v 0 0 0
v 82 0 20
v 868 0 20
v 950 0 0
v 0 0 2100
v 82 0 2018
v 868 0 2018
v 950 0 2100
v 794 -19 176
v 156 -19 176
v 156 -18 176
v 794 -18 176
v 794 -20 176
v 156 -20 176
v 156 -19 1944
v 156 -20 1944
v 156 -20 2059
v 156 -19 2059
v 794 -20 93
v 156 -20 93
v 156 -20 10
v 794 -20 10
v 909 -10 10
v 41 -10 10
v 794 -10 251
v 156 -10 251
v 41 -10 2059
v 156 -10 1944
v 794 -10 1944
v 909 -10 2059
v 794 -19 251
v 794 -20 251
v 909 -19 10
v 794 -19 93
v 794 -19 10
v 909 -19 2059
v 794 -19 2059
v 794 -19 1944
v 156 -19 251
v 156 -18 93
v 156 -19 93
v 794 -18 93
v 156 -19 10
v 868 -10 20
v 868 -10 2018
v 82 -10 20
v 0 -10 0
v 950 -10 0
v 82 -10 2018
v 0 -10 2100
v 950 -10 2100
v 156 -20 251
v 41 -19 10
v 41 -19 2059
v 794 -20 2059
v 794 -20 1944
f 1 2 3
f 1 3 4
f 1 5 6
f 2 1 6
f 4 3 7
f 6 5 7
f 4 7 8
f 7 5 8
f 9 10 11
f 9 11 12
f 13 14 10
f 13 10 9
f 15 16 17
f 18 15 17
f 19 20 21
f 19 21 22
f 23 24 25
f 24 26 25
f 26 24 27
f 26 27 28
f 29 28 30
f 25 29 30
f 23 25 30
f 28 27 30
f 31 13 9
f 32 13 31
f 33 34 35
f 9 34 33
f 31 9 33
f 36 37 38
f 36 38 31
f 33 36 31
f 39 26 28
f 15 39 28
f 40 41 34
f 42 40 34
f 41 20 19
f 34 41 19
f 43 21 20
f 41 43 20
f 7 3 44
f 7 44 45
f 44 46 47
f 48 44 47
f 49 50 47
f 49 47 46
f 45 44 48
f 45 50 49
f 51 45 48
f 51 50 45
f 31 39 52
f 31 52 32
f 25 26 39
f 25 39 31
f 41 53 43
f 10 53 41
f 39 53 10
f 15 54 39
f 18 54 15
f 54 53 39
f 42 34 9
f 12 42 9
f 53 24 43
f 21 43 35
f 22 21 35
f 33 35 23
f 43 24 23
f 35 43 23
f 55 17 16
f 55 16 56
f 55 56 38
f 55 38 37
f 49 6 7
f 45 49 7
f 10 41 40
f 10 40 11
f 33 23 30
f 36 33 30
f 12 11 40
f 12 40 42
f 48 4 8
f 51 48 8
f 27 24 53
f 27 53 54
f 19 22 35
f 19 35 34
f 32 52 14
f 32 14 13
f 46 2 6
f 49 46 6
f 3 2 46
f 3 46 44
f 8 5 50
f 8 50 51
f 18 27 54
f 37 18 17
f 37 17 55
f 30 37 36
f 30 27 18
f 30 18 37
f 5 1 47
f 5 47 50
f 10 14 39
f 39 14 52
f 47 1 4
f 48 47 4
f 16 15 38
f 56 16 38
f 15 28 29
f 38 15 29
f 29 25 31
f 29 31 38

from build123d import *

# Parameters (mm, degrees)
F0_W     = 950
F0_H     = 2100
F0_W_2   = 786
F0_H_2   = 1998
F1_DEPTH = 10
F2_W     = 868
F2_H     = 2049
F2_W_2   = 786
F2_H_2   = 1998
F2_W_3   = 638
F2_H_3   = 1693
F3_DEPTH = 10
F4_W     = 115
F4_H     = 2049
F5_DEPTH = 1
F6_W     = 638
F6_H     = 83
F7_DEPTH = 2


with BuildPart() as f1:
    # F0 (on Front) → F1 (new body)
    with BuildSketch(Plane.XZ):
        with Locations((475, 1050)):
            Rectangle(F0_W, F0_H)
        with Locations((475, 1019)):
            Rectangle(F0_W_2, F0_H_2, mode=Mode.SUBTRACT)
    extrude(amount=F1_DEPTH)


with BuildPart() as f3:
    # F2 (on face) → F3 (new body)
    with BuildSketch(Plane.XZ.offset(10)):
        with Locations((475, 1034.5)):
            Rectangle(F2_W, F2_H)
        with Locations((475, 1019)):
            Rectangle(F2_W_2, F2_H_2, mode=Mode.SUBTRACT)
        with Locations((475, 1034.5)):
            Rectangle(F2_W, F2_H)
        with Locations((475, 1097.5)):
            Rectangle(F2_W_3, F2_H_3, mode=Mode.SUBTRACT)
    extrude(amount=F3_DEPTH)

    # F4 (on face) → F5 (cut)
    with BuildSketch(Plane.XZ.offset(20)):
        with Locations((98.5, 1034.5)):
            Rectangle(F4_W, F4_H)
        with Locations((851.5, 1034.5)):
            Rectangle(F4_W, F4_H)
    extrude(amount=-F5_DEPTH, mode=Mode.SUBTRACT)

    # F6 (on face) → F7 (cut)
    with BuildSketch(Plane.XZ.offset(20)):
        with Locations((475, 134.5)):
            Rectangle(F6_W, F6_H)
    extrude(amount=-F7_DEPTH, mode=Mode.SUBTRACT)


solid = Compound([f1.part, f3.part])
